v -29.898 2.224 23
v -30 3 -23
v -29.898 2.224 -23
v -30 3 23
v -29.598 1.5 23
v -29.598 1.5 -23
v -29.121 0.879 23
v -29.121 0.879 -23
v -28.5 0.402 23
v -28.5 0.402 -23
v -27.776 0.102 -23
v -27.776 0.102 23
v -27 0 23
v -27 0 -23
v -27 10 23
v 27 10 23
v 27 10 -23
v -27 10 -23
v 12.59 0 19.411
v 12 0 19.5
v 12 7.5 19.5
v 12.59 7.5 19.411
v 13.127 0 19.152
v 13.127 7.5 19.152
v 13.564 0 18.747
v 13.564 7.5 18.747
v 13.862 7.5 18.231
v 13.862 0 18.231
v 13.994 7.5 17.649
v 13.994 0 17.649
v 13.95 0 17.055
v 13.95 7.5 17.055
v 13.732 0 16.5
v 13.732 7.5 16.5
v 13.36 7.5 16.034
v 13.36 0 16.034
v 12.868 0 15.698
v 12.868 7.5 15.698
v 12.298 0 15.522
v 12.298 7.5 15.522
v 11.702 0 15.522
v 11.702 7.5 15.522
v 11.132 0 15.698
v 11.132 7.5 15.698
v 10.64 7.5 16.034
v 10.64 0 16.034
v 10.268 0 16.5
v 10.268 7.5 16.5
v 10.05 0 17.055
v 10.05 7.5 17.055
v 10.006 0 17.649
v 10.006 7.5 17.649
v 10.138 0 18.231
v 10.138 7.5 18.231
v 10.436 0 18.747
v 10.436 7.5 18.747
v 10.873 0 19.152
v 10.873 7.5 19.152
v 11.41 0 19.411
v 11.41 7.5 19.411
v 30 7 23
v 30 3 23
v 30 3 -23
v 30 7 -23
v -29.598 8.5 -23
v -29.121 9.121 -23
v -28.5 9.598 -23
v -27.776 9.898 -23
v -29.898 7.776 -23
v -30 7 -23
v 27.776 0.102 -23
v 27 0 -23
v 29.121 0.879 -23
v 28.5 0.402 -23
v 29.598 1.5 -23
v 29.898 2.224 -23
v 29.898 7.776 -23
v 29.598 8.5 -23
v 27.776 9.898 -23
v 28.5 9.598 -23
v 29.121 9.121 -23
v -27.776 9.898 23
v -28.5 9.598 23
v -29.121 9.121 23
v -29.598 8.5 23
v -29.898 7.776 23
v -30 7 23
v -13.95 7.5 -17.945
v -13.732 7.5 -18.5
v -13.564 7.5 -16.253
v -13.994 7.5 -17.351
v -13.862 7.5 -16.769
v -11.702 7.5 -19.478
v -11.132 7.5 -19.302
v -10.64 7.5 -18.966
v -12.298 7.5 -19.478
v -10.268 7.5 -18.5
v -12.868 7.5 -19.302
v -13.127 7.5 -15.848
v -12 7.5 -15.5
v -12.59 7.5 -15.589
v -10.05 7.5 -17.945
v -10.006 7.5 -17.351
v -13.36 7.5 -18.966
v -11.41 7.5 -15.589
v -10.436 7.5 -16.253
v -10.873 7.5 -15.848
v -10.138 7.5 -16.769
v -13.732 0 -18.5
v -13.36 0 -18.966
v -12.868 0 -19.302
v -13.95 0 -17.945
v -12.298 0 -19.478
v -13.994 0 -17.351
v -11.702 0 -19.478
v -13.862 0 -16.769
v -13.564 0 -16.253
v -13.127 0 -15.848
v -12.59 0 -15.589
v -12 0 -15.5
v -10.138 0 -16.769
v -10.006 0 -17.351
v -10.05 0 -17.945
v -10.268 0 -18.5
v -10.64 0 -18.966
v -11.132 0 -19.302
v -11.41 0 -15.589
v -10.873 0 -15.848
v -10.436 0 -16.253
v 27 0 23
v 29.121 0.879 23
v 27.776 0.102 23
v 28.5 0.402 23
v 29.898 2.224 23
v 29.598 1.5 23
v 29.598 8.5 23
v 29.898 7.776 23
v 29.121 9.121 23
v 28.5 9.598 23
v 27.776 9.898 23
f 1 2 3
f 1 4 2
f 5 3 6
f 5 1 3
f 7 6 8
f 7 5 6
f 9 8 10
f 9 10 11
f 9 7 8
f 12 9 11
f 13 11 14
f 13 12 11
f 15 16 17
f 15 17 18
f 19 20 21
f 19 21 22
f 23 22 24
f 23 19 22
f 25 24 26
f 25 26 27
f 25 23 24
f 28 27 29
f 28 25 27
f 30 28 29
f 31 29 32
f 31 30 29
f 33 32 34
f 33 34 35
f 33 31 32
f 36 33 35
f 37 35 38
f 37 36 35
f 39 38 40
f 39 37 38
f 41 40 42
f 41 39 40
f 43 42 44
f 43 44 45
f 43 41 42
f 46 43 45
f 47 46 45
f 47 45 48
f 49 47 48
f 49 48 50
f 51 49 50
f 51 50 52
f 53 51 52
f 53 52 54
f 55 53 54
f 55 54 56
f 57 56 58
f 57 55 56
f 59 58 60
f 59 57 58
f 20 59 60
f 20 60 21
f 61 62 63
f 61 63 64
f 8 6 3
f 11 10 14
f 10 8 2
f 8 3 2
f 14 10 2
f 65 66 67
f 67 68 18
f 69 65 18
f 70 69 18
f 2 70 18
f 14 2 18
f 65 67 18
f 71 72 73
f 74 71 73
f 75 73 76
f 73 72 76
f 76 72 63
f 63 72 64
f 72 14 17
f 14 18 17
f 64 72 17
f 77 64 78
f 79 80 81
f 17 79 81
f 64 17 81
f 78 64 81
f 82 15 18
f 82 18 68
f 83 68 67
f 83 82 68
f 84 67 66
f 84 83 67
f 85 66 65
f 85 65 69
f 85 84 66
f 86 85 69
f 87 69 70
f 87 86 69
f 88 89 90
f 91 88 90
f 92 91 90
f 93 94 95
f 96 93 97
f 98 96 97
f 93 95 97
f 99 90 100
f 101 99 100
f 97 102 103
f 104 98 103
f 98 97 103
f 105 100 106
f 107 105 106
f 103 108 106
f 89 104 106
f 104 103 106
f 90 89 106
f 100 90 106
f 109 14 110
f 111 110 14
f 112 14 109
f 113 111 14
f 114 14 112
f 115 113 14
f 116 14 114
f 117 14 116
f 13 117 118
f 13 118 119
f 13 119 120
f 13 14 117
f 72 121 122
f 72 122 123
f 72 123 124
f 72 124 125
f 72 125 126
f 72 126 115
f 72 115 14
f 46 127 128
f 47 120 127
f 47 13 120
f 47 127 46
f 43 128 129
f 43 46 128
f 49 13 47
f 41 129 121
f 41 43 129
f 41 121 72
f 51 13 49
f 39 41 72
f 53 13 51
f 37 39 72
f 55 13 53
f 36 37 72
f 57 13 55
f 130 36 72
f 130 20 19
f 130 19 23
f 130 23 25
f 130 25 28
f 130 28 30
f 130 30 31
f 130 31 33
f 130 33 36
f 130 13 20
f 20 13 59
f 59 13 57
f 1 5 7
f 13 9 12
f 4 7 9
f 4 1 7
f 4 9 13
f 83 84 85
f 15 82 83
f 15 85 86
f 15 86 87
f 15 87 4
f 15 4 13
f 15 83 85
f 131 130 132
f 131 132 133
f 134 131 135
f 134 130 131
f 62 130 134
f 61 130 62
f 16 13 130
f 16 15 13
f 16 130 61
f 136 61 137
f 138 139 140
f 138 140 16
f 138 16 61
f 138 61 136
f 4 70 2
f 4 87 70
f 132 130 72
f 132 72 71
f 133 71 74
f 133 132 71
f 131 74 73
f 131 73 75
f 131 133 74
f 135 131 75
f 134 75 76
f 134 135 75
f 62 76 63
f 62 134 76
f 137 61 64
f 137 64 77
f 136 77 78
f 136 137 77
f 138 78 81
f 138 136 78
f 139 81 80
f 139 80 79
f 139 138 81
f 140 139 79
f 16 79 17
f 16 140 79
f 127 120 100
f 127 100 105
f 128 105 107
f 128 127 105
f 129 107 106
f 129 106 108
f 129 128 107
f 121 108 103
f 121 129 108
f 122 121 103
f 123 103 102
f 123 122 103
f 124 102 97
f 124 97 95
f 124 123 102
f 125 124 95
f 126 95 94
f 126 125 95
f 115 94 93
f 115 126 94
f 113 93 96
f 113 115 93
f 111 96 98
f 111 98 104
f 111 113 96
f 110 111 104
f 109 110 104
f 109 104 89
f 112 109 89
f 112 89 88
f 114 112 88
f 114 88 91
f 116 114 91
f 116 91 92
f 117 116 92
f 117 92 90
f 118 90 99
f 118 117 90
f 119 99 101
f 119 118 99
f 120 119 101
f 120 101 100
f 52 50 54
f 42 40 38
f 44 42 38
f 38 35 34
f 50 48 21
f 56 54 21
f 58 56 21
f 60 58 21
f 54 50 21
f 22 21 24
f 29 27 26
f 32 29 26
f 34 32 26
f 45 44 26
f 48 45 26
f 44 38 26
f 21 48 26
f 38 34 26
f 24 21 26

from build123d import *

# Parameters (mm, degrees)
BOSS_EXTRUDE1_DEPTH = 23
SKETCH2_R           = 2
CUT_EXTRUDE1_DEPTH  = 7.5


with BuildPart() as part:
    # Sketch1 → Boss-Extrude1 (new, symmetric)
    with BuildSketch(Plane.XY):
        with BuildLine():
            Line((-27, 0), (27, 0))
            ThreePointArc((27, 0), (29.121320344, 0.878679656), (30, 3))
            Line((30, 3), (30, 7))
            ThreePointArc((30, 7), (29.121320344, 9.121320344), (27, 10))
            Line((27, 10), (-27, 10))
            ThreePointArc((-27, 10), (-29.121320344, 9.121320344), (-30, 7))
            Line((-30, 7), (-30, 3))
            ThreePointArc((-30, 3), (-29.121320344, 0.878679656), (-27, 0))
        make_face()
    extrude(amount=BOSS_EXTRUDE1_DEPTH, both=True)

    # Sketch2 → Cut-Extrude1 (cut)
    with BuildSketch(Plane(origin=(0, 0, 0), x_dir=(1, 0, 0), z_dir=(0, 1, 0))):
        with Locations(Location((12, -17.5, 0), (0, 0, 270))):
            Circle(SKETCH2_R)
        with Locations(Location((-12, 17.5, 0), (0, 0, 270))):
            Circle(SKETCH2_R)
    extrude(amount=CUT_EXTRUDE1_DEPTH, mode=Mode.SUBTRACT)


solid = part.part
